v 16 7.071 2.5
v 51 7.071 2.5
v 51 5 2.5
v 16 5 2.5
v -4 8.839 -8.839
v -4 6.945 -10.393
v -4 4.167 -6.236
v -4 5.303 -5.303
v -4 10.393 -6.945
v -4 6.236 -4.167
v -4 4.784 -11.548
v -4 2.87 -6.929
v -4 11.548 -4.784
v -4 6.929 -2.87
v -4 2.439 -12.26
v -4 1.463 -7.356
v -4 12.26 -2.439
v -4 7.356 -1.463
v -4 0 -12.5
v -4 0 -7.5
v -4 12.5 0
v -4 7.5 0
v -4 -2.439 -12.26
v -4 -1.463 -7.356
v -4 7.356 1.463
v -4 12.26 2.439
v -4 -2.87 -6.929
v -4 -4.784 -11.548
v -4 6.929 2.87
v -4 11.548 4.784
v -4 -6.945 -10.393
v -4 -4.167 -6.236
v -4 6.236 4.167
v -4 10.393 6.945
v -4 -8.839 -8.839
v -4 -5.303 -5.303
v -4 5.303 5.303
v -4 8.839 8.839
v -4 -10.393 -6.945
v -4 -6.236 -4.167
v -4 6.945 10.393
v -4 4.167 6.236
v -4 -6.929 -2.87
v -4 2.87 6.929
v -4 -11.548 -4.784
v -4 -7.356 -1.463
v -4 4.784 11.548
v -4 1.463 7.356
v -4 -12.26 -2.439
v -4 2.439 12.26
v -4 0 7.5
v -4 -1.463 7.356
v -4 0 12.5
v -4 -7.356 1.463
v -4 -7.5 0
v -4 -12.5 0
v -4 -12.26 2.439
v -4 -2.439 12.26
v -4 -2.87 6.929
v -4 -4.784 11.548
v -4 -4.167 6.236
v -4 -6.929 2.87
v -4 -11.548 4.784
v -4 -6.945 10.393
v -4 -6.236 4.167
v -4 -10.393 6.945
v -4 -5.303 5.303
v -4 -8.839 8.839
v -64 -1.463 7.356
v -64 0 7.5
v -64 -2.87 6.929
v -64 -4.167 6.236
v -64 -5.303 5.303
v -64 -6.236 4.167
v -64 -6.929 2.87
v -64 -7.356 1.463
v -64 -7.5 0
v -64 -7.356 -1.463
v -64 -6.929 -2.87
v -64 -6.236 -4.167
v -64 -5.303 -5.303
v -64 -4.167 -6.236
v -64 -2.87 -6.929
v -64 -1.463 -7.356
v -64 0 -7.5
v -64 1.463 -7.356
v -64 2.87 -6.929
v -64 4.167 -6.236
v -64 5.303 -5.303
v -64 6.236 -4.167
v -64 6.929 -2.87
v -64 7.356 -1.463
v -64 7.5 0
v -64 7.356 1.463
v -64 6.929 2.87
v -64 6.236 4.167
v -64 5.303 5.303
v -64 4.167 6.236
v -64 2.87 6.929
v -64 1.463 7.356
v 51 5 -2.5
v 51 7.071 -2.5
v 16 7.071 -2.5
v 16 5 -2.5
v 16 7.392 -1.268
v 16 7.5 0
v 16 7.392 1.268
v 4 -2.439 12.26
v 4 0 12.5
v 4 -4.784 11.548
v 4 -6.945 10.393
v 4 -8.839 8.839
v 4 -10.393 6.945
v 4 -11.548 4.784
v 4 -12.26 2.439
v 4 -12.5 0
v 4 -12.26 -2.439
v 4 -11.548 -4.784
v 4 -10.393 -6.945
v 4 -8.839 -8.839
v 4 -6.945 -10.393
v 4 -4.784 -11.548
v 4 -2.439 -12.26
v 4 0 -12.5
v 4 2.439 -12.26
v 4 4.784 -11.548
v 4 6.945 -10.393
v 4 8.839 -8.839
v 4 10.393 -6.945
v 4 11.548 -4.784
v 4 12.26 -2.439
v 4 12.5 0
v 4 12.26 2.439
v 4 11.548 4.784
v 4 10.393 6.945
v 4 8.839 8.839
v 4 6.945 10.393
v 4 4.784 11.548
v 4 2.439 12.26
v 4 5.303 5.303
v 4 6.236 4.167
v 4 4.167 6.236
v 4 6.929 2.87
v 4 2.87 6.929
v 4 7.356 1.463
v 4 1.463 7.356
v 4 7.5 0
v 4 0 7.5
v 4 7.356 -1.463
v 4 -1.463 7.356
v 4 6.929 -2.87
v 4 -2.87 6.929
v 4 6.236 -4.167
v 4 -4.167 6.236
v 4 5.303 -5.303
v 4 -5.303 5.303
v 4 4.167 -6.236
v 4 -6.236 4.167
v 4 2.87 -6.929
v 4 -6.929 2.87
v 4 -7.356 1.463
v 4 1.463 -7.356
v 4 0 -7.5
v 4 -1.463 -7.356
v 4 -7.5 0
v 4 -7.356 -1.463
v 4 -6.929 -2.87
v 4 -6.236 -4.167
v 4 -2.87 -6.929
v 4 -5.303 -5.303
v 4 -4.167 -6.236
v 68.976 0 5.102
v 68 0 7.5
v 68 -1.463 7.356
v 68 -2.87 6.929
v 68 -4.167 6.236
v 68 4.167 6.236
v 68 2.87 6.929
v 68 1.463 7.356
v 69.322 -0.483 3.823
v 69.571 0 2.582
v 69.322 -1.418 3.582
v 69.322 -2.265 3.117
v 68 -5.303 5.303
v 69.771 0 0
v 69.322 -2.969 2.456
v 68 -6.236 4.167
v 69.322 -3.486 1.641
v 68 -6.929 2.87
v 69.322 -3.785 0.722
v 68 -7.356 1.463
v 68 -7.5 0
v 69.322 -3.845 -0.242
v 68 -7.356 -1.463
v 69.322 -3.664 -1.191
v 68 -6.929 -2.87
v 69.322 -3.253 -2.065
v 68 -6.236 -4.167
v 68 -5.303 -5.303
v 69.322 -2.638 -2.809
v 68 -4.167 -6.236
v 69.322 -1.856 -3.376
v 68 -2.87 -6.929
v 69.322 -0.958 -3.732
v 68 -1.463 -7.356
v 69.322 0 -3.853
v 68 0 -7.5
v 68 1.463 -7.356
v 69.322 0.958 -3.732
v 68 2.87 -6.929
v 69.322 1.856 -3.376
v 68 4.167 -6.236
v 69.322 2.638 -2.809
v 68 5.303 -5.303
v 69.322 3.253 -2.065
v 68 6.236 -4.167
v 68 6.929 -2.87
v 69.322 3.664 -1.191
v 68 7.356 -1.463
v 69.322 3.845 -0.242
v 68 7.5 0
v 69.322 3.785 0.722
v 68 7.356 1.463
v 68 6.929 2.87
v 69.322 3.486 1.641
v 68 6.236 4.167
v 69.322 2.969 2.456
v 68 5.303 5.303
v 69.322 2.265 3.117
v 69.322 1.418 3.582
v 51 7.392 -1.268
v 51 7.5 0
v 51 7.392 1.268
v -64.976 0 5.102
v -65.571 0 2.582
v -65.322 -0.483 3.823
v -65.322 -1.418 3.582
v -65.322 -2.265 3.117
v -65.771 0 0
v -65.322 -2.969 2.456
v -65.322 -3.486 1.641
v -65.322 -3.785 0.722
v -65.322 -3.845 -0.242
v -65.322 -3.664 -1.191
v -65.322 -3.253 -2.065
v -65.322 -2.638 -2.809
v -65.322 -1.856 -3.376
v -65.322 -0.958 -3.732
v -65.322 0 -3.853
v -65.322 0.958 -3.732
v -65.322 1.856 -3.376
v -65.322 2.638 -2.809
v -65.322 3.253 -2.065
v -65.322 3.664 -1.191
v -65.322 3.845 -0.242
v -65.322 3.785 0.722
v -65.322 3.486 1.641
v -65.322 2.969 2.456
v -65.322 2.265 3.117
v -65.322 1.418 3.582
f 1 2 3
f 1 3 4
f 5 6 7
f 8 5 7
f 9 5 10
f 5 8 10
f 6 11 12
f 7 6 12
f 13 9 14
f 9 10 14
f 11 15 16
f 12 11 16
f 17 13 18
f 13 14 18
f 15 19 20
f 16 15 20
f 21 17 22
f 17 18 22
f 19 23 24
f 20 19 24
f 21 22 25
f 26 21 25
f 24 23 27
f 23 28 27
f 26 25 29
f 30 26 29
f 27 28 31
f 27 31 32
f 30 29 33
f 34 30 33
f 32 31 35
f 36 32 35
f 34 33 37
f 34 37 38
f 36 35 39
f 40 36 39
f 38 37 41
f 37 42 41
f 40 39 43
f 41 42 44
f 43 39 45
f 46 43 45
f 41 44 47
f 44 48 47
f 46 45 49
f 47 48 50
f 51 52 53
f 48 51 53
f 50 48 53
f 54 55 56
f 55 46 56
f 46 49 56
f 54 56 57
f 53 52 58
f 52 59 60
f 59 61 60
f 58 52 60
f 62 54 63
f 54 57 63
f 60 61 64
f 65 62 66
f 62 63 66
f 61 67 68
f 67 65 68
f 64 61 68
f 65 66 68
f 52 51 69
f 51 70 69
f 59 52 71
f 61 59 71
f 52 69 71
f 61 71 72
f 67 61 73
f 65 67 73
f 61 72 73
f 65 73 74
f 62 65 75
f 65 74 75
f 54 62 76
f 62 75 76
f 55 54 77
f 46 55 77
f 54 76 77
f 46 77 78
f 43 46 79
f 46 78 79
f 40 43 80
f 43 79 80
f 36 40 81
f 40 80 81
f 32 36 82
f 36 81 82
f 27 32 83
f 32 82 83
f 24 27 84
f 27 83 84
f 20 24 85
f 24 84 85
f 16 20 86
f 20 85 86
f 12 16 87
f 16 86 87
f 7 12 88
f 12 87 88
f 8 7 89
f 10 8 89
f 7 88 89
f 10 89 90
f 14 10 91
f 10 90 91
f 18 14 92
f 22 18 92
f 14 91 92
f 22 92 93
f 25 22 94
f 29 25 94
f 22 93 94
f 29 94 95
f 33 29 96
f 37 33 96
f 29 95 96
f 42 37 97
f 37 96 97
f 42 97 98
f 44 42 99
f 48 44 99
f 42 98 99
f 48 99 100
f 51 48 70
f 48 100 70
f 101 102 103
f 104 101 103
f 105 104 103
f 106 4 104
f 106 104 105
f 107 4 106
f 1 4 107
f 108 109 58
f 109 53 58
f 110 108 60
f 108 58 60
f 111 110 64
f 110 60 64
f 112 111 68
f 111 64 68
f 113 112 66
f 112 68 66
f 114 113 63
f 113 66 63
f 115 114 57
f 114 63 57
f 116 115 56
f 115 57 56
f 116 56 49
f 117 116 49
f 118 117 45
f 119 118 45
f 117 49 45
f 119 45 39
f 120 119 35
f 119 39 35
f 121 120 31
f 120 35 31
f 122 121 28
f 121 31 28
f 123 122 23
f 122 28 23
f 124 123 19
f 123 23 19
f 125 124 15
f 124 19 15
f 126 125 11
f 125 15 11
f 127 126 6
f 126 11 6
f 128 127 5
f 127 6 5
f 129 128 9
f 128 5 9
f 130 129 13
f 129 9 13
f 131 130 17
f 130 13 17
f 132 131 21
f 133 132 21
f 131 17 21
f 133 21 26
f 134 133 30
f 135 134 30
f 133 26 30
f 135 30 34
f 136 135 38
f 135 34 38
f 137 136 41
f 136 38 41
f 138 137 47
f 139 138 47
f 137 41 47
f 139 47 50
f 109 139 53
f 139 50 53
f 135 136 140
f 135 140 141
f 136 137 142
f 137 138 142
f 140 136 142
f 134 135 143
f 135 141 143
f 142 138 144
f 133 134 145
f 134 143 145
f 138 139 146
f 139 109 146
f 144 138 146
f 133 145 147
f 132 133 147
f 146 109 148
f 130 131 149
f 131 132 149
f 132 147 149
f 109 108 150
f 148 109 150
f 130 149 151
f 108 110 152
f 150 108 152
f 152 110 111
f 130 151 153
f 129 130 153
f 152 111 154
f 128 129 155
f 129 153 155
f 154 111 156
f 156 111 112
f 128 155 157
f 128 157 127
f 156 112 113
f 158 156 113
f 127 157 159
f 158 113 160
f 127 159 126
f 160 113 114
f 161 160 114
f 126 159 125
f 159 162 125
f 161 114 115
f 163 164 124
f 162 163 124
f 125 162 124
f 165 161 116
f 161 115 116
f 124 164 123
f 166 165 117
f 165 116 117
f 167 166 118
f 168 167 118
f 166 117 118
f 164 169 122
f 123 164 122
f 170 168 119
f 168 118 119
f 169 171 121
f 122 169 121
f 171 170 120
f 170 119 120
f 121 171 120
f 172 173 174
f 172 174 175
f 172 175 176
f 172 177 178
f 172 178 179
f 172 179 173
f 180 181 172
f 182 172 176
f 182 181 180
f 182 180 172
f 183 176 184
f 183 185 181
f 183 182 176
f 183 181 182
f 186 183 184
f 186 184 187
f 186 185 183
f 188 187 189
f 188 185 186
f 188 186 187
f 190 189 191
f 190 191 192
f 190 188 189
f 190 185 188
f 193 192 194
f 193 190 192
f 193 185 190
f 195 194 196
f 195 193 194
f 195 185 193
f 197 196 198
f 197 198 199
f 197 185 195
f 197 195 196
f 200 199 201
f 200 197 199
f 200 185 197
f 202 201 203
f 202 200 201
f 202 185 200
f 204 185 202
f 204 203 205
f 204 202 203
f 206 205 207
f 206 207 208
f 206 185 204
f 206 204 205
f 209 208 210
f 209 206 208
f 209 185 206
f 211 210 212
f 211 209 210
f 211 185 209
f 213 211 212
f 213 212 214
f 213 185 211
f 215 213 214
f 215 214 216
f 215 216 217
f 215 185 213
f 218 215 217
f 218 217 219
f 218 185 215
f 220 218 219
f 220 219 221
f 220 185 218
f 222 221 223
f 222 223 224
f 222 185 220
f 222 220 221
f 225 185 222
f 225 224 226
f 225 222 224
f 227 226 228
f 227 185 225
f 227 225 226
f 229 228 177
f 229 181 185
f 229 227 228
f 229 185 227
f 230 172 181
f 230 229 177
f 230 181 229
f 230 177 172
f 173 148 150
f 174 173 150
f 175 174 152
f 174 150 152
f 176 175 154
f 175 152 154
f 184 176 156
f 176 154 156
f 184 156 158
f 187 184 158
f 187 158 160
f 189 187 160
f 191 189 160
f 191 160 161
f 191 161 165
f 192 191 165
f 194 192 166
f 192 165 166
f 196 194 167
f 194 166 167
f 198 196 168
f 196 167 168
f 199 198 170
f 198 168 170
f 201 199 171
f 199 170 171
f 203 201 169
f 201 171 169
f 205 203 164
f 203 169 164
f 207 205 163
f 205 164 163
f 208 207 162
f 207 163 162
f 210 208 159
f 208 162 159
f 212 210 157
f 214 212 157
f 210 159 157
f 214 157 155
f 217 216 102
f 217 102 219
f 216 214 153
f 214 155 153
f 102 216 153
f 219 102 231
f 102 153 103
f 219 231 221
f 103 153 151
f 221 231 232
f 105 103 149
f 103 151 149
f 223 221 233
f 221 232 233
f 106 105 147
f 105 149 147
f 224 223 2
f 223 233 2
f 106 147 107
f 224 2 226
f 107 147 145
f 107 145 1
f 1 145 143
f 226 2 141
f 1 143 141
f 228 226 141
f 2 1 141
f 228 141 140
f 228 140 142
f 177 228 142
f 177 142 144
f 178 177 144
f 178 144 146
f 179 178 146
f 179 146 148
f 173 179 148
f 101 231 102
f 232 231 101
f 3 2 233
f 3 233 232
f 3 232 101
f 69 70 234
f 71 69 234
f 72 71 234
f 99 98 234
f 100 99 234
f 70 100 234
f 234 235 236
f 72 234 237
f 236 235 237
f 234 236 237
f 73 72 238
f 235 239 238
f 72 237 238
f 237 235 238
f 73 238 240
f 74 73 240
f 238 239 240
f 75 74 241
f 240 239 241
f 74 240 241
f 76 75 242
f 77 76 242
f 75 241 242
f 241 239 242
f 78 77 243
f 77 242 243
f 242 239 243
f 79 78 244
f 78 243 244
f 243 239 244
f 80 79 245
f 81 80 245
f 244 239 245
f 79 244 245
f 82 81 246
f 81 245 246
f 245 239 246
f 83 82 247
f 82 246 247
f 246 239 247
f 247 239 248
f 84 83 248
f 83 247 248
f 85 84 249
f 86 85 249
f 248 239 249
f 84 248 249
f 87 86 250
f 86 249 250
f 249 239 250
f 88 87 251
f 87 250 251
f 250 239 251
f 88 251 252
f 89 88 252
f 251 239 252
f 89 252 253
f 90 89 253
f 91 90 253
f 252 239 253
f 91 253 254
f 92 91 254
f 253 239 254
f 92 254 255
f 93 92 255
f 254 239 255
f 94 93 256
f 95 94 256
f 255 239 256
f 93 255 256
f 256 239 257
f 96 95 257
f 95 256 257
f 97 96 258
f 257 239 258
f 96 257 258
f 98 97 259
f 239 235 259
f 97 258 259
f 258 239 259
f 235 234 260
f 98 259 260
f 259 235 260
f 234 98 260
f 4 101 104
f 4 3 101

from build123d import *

# Parameters (mm, degrees)
CUT_EXTRUDE1_DEPTH = 2.5


with BuildPart() as part:
    # Sketch1 → Revolve1 (revolve)
    with BuildSketch(Plane.XY, mode=Mode.PRIVATE) as revolve1_sk:
        Polygon((-64, 7.5), (-64, 0), (68, 0), (68, 7.5), (4, 7.5), (4, 12.5), (-4, 12.5), (-4, 7.5), align=None)
        with BuildLine():
            Line((69.770509831, 0), (68, 0))
            Line((68, 0), (68, 7.5))
            ThreePointArc((68, 7.5), (69.321881746, 3.853073613), (69.770509831, 0))
        make_face()
        with BuildLine():
            Line((-64, 0), (-64, 7.5))
            ThreePointArc((-64, 7.5), (-65.321881746, 3.853073613), (-65.770509831, 0))
            Line((-65.770509831, 0), (-64, 0))
        make_face()
    revolve(revolve1_sk.sketch.rotate(Axis((-80.68485448, 0, 0), (1, 0, 0)), 90), axis=Axis((-80.68485448, 0, 0), (1, 0, 0)))

    # Sketch2 → Cut-Extrude1 (cut, symmetric)
    with BuildSketch(Plane.XY):
        Polygon((51, 10), (51, 5), (16, 5), (16, 9.65), align=None)
    extrude(amount=CUT_EXTRUDE1_DEPTH, both=True, mode=Mode.SUBTRACT)


solid = part.part
